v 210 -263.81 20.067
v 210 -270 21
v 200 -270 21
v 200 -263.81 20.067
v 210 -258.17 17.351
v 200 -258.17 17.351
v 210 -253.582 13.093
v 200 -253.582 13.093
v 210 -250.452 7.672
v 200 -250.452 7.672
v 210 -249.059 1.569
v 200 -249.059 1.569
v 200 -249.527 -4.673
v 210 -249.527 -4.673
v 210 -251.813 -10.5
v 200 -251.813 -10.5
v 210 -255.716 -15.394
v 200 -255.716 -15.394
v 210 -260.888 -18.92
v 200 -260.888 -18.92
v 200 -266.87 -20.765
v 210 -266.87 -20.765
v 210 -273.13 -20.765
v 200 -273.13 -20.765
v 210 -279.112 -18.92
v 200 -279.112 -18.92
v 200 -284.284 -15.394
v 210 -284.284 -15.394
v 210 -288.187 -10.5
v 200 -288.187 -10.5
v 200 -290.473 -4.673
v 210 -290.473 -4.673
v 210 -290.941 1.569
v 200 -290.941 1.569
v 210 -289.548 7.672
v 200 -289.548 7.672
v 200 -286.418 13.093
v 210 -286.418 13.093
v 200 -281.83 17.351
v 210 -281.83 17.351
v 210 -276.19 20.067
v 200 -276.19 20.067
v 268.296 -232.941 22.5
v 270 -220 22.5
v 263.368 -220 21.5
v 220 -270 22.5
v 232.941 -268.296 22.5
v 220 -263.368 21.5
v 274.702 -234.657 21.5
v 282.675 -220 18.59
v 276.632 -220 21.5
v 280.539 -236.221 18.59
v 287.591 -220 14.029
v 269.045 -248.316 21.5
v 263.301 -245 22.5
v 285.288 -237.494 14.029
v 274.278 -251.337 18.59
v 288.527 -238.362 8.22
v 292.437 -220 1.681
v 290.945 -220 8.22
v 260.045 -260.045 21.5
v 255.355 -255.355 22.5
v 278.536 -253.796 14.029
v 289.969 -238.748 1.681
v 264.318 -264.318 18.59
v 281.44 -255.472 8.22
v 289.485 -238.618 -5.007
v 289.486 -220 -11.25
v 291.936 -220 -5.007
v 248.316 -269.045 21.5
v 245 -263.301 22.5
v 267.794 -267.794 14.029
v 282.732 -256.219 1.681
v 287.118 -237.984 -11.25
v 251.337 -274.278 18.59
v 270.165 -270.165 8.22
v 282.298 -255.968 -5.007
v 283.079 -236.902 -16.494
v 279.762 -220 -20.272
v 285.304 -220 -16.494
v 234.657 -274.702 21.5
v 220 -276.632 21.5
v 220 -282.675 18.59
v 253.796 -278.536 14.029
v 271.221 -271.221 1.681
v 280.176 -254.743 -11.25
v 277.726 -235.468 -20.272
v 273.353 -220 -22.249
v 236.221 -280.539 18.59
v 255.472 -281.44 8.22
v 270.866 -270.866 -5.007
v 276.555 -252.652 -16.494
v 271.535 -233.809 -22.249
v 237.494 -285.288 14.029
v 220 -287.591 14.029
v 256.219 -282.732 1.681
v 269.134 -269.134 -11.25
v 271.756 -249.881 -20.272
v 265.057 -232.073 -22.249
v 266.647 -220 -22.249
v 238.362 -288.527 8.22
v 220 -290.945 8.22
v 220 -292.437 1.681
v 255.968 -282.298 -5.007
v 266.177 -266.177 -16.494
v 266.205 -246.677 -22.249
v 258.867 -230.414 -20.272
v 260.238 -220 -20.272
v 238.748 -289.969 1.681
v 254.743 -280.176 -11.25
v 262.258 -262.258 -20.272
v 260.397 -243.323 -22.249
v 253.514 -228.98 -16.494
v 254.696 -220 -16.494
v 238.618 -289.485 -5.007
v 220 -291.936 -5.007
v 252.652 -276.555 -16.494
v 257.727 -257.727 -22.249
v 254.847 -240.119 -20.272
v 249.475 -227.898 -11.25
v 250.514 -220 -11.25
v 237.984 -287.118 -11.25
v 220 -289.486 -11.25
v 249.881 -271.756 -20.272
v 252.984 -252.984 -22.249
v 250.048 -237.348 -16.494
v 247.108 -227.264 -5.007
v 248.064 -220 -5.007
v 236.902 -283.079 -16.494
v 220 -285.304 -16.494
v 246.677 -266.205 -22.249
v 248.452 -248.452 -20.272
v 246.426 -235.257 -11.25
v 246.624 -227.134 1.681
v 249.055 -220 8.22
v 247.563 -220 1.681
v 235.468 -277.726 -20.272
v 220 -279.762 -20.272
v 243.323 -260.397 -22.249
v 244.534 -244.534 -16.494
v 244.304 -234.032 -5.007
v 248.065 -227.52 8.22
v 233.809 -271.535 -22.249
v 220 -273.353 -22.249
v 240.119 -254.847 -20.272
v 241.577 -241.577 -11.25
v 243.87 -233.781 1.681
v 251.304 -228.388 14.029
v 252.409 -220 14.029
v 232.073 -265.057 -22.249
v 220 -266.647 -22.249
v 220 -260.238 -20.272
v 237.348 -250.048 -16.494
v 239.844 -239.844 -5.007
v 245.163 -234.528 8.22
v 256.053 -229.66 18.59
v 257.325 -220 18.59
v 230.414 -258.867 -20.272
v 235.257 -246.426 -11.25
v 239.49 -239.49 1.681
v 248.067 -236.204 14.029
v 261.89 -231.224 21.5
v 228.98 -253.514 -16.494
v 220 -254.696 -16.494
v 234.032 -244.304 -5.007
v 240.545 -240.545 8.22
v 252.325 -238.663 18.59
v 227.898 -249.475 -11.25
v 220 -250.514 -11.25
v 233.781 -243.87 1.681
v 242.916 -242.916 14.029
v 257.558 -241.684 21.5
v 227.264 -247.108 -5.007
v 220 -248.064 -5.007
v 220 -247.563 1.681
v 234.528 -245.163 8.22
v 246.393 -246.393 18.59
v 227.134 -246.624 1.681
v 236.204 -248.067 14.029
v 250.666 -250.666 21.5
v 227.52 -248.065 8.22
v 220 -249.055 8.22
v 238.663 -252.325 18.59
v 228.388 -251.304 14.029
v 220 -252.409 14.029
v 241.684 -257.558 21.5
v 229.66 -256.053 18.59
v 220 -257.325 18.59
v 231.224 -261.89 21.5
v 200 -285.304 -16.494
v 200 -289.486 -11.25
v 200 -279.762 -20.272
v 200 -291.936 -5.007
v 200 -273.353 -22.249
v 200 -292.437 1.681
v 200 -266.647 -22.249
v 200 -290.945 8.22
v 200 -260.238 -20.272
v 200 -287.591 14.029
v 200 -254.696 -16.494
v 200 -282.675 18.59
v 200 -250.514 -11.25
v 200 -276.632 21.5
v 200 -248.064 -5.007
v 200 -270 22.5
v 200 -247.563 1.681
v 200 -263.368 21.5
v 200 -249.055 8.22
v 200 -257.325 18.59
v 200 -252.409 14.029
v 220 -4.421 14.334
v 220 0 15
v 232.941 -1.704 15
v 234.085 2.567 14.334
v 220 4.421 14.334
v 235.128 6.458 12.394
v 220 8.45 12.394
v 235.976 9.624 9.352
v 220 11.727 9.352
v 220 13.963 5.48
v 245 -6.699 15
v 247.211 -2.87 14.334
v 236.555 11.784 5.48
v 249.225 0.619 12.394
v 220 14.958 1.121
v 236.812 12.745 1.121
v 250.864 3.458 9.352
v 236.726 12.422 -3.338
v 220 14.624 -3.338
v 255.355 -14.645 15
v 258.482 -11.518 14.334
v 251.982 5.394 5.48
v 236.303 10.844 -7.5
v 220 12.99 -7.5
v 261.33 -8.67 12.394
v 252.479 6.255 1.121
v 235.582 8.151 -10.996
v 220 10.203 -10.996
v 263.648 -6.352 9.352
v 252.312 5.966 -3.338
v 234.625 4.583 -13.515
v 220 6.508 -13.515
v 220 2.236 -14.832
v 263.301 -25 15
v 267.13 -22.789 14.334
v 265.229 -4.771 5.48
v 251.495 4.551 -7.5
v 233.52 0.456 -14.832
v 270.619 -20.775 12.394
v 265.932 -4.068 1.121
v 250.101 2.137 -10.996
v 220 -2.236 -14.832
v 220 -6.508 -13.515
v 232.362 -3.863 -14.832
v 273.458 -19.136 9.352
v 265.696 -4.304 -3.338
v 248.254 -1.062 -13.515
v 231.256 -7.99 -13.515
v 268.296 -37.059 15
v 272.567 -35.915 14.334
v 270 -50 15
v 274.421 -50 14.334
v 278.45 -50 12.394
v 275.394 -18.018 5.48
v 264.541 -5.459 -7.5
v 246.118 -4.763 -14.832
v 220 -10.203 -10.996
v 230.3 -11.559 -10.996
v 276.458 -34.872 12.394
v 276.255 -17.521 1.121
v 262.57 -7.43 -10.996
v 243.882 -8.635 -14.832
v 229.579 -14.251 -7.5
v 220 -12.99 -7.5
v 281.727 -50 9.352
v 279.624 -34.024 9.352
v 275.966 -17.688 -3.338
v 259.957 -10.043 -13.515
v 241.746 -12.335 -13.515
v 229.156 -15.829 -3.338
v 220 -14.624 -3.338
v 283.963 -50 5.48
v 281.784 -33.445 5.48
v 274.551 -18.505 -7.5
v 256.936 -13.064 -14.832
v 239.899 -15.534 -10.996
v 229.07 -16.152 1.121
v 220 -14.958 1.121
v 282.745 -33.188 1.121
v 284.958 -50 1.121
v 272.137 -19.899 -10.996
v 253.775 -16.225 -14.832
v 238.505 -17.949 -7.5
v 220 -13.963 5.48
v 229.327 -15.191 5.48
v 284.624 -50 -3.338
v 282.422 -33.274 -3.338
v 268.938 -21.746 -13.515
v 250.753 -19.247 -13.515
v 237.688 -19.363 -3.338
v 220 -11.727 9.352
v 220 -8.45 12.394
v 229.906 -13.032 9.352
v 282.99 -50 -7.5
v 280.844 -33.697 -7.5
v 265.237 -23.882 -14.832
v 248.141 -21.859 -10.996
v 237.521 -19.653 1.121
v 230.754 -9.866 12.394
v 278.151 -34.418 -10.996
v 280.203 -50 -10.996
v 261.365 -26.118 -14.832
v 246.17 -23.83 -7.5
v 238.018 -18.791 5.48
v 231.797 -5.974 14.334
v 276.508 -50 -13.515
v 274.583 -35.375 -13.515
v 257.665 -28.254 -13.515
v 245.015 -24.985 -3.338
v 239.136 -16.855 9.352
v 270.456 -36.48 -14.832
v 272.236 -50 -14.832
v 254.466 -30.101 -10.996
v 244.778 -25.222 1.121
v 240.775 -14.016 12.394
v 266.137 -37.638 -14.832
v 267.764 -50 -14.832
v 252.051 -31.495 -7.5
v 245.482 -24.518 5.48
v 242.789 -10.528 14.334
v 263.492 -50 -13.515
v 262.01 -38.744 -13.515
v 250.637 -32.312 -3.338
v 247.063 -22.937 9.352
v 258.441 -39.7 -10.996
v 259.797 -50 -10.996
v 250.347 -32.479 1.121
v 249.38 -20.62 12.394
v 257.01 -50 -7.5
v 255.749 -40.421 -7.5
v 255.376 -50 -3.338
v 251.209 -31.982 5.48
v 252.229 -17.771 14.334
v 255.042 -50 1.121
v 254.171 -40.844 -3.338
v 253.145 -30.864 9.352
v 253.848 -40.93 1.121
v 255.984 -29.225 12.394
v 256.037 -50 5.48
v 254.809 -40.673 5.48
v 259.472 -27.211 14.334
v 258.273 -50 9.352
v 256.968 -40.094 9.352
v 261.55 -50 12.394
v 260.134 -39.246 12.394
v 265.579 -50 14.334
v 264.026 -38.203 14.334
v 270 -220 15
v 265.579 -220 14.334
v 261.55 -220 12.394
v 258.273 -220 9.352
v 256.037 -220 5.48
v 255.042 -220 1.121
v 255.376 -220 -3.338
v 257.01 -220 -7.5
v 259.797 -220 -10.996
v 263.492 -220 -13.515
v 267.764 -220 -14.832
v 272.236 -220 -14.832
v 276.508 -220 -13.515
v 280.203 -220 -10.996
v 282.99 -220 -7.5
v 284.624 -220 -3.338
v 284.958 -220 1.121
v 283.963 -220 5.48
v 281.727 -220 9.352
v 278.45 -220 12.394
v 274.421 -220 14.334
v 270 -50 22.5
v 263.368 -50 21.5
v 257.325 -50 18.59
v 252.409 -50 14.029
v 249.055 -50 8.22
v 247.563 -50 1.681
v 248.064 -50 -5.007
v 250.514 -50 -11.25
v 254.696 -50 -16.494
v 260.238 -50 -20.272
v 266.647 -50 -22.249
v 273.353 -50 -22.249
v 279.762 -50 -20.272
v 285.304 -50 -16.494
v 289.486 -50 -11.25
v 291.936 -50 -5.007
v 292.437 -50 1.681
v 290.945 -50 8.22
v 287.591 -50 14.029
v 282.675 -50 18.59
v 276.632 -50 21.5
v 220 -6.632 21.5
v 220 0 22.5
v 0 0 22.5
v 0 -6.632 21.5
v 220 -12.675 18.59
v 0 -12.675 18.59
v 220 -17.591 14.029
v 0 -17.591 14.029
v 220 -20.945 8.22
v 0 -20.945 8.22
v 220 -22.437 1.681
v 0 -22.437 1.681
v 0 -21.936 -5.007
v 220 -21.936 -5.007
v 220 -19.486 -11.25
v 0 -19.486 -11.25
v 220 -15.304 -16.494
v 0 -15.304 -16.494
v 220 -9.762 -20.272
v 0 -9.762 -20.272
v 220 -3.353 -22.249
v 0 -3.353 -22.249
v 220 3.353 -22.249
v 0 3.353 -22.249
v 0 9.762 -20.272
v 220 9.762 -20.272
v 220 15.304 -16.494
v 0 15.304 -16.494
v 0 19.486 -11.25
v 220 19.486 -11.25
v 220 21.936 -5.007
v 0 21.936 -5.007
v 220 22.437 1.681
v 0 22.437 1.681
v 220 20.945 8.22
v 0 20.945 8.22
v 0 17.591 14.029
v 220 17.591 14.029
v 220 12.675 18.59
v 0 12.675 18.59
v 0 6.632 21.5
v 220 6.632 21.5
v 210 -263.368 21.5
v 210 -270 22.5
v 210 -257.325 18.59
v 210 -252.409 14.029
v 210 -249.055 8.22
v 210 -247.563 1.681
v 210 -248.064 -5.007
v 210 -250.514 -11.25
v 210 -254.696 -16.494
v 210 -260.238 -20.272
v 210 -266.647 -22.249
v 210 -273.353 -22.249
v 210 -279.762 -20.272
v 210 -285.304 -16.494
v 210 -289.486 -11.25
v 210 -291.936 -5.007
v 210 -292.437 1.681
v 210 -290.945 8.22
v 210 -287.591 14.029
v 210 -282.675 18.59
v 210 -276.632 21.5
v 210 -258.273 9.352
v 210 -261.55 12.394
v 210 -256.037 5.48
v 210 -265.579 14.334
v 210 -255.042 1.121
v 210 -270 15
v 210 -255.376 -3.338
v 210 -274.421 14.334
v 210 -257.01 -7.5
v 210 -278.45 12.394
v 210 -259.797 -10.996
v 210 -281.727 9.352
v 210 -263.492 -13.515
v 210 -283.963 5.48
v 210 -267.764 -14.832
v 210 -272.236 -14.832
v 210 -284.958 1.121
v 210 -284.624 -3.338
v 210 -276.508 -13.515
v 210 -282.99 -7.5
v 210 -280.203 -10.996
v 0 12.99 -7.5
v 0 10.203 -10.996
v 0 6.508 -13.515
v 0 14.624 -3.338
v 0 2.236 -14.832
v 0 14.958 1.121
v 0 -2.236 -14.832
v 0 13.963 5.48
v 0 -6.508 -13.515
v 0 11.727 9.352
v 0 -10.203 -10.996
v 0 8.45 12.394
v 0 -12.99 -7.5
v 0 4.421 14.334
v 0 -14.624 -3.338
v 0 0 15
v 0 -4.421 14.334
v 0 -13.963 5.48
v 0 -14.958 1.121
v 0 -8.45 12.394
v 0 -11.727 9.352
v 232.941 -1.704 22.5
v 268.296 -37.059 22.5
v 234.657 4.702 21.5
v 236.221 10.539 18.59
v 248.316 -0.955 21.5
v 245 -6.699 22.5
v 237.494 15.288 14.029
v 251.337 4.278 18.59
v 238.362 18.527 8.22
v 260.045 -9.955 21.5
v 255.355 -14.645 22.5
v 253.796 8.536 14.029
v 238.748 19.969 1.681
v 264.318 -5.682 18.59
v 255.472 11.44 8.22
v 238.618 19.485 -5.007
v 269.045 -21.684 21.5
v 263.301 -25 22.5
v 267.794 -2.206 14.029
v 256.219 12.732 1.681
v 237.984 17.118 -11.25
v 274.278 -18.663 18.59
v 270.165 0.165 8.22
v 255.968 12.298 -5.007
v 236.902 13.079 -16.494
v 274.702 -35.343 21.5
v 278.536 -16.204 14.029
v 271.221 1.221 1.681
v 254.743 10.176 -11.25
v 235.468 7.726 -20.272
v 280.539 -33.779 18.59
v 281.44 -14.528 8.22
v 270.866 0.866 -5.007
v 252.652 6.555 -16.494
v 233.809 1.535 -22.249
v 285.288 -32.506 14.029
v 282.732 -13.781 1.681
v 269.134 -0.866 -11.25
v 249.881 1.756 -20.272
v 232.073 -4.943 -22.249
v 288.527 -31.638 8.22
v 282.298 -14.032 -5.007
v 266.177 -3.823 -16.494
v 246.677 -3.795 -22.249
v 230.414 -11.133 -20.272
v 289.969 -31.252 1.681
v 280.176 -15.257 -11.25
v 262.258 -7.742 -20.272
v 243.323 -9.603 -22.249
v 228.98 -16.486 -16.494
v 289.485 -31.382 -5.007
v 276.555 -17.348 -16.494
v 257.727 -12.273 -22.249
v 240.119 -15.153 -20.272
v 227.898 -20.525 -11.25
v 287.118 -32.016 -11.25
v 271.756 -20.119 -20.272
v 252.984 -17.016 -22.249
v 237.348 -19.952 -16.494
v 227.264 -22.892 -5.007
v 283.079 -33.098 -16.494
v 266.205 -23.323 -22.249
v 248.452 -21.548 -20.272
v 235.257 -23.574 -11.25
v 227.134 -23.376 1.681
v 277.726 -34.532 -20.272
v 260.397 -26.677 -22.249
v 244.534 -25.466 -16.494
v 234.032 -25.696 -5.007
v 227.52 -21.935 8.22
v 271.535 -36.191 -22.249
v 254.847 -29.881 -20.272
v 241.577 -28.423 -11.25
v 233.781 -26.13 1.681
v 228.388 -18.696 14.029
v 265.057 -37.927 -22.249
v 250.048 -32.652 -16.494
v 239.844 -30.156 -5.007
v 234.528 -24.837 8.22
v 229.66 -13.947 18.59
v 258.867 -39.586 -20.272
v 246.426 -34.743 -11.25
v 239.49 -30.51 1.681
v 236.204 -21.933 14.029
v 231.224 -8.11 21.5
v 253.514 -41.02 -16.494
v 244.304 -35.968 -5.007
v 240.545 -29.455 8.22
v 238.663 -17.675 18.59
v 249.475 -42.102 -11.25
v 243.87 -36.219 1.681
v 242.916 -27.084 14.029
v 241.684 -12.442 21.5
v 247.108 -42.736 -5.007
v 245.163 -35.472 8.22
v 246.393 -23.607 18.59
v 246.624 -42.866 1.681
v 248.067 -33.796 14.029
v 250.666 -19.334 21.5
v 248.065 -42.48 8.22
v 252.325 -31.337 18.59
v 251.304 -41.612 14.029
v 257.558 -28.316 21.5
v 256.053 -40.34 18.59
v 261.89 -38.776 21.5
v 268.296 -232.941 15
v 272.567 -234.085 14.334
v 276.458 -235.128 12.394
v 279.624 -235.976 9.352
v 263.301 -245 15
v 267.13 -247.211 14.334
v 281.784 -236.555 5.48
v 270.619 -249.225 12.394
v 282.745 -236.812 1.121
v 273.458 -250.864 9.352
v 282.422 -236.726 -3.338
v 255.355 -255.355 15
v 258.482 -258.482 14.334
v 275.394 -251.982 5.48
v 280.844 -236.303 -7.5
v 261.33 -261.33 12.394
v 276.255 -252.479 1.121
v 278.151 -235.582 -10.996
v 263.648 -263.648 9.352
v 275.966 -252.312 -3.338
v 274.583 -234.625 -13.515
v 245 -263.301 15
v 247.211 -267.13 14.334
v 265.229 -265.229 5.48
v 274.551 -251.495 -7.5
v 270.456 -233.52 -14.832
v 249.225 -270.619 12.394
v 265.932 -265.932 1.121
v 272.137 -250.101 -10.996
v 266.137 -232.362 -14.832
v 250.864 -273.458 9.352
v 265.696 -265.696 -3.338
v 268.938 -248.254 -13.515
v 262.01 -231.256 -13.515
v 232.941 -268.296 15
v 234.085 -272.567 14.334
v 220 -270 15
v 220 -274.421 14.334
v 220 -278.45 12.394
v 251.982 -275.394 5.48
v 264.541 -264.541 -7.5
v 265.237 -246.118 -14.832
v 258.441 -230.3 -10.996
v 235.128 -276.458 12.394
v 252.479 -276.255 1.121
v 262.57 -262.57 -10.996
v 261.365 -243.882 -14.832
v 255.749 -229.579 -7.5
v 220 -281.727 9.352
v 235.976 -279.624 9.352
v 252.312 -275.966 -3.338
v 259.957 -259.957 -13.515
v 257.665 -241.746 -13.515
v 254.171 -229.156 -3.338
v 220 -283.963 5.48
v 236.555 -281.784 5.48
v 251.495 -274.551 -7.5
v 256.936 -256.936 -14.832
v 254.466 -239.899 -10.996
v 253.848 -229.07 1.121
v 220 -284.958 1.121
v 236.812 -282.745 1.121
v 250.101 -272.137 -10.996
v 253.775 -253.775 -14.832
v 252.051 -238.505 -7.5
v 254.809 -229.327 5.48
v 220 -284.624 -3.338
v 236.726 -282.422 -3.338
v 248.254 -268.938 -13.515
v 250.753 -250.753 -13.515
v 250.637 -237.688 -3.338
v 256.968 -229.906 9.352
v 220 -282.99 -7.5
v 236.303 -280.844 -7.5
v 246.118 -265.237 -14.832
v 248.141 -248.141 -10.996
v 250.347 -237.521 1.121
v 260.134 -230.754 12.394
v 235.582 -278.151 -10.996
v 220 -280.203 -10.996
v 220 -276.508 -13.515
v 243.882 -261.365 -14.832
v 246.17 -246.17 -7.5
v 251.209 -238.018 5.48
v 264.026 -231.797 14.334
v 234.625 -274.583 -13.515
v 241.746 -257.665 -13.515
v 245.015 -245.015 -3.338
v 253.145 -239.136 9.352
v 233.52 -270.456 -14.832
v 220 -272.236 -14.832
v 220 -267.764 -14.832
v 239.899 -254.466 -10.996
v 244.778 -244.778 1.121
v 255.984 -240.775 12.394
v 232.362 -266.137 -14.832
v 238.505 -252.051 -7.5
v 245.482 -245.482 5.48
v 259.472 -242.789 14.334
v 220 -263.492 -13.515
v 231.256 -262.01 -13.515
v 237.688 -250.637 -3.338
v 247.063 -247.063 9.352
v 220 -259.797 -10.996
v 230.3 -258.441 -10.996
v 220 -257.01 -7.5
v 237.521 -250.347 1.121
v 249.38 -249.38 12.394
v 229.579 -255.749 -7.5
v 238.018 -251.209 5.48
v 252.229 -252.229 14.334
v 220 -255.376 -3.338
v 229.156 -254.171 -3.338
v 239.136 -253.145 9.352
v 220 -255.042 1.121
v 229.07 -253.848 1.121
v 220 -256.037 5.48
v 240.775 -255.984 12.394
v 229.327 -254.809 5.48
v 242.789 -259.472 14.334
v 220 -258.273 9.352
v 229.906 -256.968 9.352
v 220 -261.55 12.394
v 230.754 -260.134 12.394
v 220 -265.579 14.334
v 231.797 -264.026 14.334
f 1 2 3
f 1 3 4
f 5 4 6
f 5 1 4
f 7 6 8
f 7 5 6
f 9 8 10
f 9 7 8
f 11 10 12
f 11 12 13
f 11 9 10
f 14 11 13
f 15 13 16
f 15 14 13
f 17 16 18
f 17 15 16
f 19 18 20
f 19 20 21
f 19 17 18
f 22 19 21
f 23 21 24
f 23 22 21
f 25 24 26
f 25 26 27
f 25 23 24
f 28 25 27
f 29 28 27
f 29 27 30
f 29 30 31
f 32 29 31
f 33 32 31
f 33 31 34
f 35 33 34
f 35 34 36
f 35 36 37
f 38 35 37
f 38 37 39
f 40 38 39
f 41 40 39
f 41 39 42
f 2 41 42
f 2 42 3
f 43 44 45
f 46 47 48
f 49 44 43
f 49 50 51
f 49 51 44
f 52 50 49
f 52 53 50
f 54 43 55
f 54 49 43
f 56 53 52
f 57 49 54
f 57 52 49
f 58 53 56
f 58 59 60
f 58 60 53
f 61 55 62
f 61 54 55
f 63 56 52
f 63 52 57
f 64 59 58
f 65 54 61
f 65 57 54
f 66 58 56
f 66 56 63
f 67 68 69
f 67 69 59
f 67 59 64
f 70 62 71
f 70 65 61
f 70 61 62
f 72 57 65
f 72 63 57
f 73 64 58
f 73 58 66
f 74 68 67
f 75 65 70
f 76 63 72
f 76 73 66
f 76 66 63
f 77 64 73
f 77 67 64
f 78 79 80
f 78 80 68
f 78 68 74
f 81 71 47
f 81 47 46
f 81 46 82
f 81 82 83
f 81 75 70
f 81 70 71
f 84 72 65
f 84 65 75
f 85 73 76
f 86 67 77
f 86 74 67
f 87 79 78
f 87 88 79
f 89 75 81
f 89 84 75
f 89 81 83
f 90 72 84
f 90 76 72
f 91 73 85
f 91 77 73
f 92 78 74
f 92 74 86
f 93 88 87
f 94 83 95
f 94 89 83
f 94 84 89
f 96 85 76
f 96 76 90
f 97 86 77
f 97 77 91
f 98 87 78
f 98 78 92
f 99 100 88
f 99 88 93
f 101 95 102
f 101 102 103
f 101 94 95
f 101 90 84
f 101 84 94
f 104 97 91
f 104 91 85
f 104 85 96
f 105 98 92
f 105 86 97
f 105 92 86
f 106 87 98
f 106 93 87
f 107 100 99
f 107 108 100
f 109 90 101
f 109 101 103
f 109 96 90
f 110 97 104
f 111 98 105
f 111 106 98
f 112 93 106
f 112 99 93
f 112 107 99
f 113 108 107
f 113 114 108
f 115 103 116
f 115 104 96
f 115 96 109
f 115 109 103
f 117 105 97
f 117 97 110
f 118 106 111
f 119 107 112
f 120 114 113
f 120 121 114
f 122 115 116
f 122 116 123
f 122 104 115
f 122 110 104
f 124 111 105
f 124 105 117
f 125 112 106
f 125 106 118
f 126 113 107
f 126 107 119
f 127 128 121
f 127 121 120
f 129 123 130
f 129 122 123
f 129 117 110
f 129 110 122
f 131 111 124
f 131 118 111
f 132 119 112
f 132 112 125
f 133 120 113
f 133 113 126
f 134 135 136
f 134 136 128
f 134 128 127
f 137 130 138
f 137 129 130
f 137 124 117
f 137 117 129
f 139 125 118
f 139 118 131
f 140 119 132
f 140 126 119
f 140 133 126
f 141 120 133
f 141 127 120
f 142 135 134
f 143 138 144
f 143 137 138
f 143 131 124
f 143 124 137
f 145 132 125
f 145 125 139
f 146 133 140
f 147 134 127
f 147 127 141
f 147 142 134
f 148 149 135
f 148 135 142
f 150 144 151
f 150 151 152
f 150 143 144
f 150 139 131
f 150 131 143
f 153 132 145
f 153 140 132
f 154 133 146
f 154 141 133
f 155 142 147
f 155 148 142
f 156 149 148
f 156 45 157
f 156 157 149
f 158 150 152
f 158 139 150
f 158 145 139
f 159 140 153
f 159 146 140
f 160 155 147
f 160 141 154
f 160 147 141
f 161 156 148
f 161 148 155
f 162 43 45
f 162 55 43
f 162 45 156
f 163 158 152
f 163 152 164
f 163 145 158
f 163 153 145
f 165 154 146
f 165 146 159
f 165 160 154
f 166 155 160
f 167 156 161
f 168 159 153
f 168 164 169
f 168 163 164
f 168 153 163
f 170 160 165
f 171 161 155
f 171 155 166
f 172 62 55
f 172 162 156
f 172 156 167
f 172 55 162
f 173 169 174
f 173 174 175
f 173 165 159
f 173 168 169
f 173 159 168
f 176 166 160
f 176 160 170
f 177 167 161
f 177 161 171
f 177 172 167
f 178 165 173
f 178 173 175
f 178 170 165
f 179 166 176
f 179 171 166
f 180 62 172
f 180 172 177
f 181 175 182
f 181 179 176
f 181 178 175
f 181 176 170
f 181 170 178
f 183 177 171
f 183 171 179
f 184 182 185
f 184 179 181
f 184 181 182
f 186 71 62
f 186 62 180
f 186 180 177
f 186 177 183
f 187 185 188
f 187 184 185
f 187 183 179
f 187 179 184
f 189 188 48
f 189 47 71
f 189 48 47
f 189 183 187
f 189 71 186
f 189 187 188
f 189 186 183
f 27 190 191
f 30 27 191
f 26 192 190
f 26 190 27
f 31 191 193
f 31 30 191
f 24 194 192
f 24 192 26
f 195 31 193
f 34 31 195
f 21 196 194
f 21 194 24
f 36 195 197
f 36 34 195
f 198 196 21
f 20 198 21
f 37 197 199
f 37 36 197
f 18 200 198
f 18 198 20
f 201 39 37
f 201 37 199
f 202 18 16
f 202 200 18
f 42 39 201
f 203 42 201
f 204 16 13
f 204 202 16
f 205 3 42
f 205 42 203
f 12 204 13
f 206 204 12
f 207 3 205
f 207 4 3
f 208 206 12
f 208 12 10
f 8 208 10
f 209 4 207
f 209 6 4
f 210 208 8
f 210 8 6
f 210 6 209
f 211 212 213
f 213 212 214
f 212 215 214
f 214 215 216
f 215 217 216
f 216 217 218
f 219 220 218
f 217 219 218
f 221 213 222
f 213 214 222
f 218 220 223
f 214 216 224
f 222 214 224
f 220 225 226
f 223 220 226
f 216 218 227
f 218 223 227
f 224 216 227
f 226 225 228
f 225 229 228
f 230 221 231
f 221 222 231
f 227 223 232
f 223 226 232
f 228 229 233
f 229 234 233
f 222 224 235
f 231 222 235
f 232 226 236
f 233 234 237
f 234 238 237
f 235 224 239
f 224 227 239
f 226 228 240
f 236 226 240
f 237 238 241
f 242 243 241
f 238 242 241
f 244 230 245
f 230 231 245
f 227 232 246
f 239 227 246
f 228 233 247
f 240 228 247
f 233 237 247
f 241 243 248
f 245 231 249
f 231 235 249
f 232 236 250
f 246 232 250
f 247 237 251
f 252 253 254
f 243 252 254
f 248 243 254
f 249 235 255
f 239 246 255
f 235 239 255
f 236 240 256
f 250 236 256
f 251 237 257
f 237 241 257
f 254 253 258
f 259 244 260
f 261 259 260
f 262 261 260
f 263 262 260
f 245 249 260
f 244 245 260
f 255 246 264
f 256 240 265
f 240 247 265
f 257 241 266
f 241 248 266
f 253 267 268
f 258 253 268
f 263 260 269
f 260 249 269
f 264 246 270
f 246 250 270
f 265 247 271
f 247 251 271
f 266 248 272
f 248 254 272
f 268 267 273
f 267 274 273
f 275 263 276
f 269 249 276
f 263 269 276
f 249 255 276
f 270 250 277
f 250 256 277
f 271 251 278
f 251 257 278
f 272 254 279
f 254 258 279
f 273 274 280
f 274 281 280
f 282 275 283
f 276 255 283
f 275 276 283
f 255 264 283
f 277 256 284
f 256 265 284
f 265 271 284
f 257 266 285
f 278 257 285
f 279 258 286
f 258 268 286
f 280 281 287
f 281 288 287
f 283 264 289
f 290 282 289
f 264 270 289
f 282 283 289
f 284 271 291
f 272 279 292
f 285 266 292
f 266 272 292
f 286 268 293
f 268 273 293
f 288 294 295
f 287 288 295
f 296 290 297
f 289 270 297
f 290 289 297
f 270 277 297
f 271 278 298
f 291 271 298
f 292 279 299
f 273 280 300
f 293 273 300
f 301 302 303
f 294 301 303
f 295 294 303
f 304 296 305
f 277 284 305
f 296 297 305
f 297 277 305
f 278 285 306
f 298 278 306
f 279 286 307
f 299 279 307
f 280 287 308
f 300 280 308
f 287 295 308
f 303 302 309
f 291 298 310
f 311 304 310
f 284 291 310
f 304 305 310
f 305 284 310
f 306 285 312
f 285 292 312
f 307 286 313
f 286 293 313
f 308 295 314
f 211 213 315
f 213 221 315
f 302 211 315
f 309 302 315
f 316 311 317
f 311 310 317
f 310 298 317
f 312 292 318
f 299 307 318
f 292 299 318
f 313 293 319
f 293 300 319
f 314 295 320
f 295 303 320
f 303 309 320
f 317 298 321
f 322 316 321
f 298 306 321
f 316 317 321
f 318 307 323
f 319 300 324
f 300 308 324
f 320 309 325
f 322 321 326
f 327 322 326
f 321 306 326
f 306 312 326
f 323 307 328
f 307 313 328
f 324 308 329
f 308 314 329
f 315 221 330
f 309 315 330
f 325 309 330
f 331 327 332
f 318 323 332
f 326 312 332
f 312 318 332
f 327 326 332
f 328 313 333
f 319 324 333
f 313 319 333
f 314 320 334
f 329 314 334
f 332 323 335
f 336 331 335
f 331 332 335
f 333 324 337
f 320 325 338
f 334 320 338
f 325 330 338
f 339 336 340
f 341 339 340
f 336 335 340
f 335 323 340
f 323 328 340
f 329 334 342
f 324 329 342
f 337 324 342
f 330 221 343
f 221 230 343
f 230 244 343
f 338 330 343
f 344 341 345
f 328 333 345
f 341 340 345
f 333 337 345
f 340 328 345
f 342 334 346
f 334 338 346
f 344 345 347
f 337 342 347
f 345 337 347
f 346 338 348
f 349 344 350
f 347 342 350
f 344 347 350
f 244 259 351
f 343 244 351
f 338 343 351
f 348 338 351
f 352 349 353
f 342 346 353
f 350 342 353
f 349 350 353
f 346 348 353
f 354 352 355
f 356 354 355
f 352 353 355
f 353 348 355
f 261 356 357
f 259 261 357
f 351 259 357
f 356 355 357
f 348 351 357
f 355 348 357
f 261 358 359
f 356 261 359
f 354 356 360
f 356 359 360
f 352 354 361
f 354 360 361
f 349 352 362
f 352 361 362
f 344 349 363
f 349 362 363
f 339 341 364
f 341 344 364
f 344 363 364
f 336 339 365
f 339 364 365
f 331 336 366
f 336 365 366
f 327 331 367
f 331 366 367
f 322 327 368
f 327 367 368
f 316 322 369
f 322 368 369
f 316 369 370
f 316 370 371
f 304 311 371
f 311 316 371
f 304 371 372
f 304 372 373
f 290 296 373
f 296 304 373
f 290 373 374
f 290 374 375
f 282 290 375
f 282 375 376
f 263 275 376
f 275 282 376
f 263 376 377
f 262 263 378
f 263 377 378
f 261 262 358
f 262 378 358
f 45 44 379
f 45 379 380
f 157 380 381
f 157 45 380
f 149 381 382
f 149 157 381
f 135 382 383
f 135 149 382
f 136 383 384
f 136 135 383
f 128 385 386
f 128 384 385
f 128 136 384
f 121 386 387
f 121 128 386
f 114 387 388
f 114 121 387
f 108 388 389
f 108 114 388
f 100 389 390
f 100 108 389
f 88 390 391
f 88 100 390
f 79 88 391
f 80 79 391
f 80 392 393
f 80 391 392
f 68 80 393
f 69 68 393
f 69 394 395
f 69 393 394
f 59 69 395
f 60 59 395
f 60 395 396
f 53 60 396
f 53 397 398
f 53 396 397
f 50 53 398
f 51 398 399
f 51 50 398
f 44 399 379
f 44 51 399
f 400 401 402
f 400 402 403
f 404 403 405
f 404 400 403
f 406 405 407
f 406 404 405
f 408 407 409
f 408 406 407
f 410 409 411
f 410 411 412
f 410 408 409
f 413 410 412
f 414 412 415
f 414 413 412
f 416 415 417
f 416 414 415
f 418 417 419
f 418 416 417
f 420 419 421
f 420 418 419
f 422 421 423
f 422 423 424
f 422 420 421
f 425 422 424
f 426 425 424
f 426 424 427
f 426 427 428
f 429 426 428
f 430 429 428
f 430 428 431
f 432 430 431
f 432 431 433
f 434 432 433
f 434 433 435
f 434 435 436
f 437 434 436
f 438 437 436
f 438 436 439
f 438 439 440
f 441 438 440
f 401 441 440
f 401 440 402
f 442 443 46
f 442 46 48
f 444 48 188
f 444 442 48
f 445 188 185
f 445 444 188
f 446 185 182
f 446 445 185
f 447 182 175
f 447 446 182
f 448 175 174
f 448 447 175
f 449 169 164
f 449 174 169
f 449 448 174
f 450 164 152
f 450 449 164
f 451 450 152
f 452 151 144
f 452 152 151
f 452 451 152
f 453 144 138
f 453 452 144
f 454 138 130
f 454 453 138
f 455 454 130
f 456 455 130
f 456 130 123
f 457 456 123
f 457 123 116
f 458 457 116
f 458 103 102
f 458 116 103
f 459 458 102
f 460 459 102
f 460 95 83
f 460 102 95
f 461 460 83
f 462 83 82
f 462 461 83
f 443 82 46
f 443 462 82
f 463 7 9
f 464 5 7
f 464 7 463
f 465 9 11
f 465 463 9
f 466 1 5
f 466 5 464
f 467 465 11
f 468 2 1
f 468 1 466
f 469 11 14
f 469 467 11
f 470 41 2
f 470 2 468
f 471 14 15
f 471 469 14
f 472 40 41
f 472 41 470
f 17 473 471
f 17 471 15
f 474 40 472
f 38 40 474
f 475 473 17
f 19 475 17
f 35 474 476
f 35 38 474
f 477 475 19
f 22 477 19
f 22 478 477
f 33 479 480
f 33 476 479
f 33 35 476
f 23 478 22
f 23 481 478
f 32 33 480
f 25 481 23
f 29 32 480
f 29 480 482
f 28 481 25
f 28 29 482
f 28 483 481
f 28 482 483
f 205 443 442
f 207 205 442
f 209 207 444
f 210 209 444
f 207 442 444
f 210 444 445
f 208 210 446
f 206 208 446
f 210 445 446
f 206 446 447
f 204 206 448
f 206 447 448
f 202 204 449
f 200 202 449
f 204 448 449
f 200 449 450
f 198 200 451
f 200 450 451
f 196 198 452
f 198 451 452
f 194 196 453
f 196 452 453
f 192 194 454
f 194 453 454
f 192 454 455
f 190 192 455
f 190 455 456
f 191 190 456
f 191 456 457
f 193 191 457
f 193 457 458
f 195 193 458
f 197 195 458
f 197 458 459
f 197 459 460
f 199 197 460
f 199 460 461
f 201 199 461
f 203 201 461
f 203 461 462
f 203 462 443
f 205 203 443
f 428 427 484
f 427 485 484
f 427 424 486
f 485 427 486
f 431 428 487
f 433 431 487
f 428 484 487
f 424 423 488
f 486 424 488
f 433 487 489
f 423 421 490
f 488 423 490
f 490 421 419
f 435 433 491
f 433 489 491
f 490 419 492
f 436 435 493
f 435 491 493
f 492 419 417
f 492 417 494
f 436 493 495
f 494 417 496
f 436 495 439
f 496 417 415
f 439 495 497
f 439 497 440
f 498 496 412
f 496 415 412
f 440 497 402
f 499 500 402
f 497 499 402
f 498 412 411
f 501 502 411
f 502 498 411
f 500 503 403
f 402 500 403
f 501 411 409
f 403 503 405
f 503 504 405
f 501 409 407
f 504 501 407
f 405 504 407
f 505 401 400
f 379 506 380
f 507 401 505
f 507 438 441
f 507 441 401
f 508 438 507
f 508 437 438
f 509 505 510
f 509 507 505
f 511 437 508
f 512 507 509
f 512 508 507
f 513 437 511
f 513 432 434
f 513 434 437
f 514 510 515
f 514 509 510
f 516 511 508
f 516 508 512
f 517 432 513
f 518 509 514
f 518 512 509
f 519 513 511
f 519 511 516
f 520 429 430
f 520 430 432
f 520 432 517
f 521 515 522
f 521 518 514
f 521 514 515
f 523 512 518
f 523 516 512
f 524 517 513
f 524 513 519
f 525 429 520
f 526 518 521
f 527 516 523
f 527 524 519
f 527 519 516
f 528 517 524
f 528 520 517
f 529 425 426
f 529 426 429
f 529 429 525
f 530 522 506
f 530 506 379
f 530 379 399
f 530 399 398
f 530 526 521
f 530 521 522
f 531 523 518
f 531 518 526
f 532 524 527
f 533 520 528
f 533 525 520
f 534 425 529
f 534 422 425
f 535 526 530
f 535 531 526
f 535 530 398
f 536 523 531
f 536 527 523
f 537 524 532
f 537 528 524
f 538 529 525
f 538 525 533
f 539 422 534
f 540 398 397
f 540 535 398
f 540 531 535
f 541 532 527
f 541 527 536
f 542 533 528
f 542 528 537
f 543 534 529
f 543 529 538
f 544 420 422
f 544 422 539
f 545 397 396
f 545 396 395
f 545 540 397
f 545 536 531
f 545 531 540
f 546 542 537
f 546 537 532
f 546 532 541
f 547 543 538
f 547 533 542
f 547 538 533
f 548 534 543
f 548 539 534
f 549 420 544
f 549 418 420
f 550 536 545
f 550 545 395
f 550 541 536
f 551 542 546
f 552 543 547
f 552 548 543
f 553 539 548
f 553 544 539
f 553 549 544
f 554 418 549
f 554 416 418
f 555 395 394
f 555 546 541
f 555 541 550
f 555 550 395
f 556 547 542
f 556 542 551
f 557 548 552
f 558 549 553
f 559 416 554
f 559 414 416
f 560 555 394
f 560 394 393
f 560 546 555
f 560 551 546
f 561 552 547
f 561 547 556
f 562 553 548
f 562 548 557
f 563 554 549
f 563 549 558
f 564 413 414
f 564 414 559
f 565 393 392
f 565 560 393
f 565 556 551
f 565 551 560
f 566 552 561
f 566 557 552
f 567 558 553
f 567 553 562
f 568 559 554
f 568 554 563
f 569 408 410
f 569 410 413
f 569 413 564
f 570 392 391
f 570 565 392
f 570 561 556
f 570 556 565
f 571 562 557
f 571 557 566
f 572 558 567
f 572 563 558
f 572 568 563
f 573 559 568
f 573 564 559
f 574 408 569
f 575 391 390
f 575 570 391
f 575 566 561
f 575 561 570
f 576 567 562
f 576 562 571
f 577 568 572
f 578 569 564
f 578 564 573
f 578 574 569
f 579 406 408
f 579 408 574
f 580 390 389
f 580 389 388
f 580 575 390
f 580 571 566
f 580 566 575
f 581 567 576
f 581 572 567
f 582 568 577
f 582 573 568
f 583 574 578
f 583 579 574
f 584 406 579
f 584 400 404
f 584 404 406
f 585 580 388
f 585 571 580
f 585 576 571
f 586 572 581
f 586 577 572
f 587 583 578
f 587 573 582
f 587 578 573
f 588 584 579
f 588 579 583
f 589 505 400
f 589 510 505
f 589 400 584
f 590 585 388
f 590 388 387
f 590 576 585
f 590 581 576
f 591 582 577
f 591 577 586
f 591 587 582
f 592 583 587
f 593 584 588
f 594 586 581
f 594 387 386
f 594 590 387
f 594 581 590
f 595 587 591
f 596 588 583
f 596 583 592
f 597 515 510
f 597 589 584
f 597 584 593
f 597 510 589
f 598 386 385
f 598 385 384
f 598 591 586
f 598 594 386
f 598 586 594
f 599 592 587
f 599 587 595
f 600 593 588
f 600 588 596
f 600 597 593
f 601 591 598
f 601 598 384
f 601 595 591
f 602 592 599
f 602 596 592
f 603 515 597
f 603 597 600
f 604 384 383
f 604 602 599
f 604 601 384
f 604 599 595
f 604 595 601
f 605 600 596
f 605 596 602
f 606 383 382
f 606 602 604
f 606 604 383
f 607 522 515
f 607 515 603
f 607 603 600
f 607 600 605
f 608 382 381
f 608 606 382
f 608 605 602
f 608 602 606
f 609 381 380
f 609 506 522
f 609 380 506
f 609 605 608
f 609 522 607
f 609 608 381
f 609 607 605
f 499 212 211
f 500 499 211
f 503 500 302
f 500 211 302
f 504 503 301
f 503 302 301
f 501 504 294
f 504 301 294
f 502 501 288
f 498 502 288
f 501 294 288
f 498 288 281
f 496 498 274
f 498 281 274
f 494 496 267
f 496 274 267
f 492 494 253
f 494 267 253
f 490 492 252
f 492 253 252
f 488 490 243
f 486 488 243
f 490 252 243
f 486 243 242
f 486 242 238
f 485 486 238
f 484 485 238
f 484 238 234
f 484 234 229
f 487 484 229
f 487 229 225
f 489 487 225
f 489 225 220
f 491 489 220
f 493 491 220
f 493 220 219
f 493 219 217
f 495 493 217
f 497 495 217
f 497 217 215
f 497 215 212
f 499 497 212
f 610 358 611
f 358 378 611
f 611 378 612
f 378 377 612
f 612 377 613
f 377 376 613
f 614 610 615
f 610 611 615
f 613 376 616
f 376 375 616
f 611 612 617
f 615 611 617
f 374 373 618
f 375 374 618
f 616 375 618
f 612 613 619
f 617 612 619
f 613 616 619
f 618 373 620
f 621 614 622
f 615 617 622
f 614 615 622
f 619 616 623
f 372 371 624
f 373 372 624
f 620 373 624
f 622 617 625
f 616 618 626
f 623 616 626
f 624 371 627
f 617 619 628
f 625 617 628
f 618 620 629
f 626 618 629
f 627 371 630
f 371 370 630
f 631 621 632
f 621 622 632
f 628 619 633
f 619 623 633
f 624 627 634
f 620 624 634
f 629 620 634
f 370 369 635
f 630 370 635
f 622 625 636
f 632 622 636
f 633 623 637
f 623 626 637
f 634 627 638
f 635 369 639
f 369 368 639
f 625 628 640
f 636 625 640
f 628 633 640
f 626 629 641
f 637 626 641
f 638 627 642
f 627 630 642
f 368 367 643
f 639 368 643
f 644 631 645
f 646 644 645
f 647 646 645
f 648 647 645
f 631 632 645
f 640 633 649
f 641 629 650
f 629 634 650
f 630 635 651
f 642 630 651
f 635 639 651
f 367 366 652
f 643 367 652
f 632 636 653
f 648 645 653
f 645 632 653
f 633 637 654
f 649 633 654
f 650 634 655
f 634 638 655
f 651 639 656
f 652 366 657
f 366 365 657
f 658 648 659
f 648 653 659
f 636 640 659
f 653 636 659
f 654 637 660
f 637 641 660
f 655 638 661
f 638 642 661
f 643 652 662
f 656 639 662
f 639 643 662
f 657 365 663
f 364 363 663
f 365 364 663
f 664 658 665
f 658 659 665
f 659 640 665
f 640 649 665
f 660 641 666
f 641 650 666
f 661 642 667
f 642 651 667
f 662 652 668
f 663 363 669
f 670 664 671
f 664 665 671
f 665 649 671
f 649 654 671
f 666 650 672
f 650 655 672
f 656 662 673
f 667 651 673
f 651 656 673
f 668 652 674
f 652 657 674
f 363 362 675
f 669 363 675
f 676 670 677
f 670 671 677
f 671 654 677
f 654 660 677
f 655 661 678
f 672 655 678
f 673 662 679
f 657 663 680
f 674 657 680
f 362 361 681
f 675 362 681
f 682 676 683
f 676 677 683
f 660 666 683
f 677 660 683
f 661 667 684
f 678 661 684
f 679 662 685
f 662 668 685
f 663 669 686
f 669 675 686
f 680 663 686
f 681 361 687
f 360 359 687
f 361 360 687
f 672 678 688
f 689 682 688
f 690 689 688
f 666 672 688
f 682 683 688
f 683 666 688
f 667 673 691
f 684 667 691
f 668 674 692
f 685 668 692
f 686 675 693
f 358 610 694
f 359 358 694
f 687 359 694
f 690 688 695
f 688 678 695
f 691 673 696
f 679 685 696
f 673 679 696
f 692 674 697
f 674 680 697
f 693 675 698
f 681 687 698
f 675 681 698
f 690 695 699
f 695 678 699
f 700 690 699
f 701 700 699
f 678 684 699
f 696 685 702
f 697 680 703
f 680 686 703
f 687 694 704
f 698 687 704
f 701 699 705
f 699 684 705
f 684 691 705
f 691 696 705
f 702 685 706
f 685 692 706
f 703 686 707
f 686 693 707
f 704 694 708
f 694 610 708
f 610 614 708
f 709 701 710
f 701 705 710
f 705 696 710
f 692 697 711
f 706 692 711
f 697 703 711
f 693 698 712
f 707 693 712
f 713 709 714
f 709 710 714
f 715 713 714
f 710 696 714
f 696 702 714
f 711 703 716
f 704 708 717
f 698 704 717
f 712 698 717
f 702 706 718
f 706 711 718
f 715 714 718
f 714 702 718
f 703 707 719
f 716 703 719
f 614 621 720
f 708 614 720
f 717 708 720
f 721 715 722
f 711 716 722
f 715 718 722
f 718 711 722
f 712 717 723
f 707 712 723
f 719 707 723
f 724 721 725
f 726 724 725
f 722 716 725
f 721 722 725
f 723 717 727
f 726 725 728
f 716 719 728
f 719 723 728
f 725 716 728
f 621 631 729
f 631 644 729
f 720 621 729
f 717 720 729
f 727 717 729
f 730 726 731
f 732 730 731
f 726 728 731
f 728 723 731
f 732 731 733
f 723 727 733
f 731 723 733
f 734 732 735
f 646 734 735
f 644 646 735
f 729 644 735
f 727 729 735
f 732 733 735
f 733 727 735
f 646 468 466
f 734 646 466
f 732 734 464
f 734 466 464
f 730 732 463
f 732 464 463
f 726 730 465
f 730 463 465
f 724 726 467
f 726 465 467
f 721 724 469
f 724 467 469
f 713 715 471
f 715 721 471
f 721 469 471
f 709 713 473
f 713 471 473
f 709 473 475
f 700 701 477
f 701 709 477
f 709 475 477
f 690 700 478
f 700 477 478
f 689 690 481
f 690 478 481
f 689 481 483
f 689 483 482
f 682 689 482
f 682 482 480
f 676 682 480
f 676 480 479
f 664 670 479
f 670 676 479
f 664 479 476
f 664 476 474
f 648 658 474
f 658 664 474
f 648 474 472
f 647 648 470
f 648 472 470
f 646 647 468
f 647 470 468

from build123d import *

# Parameters (mm, degrees)
SWEEP_THIN1_PROFILE_R    = 22.5
SWEEP_THIN1_PROFILE_R_2  = 15
BOSS_EXTRUDE1_DEPTH      = 10
BOSS_EXTRUDE1_DEPTH_BACK = 10
SKETCH6_R                = 22.5
SKETCH6_R_2              = 21


with BuildPart() as part:
    # Sweep-Thin1: sweep along a path in Sketch1
    with BuildLine(Plane.XY) as sweep_thin1_path:
        Line((0, 0), (220, 0))
        ThreePointArc((220, 0), (255.355339059, -14.644660941), (270, -50))
        Line((270, -50), (270, -220))
        ThreePointArc((270, -220), (255.355339059, -255.355339059), (220, -270))
        Line((220, -270), (210, -270))
    # Sweep-Thin1 profile (on start of the path) → Sweep-Thin1 (sweep)
    with BuildSketch(Plane(origin=(0, 0, 0), x_dir=(0, 0, 1), z_dir=(1, 0, 0))):
        Circle(SWEEP_THIN1_PROFILE_R)
        Circle(SWEEP_THIN1_PROFILE_R_2, mode=Mode.SUBTRACT)
    sweep(path=sweep_thin1_path.line)

    # Sketch6 → Boss-Extrude1 (add, two sides: drawn at the far end of the back side and taken through both)
    with BuildSketch(Plane.ZY.offset(-210).offset(-BOSS_EXTRUDE1_DEPTH_BACK)):
        with Locations((0, -270)):
            Circle(SKETCH6_R)
        with Locations((0, -270)):
            Circle(SKETCH6_R_2, mode=Mode.SUBTRACT)
    extrude(amount=BOSS_EXTRUDE1_DEPTH + BOSS_EXTRUDE1_DEPTH_BACK)


solid = part.part
